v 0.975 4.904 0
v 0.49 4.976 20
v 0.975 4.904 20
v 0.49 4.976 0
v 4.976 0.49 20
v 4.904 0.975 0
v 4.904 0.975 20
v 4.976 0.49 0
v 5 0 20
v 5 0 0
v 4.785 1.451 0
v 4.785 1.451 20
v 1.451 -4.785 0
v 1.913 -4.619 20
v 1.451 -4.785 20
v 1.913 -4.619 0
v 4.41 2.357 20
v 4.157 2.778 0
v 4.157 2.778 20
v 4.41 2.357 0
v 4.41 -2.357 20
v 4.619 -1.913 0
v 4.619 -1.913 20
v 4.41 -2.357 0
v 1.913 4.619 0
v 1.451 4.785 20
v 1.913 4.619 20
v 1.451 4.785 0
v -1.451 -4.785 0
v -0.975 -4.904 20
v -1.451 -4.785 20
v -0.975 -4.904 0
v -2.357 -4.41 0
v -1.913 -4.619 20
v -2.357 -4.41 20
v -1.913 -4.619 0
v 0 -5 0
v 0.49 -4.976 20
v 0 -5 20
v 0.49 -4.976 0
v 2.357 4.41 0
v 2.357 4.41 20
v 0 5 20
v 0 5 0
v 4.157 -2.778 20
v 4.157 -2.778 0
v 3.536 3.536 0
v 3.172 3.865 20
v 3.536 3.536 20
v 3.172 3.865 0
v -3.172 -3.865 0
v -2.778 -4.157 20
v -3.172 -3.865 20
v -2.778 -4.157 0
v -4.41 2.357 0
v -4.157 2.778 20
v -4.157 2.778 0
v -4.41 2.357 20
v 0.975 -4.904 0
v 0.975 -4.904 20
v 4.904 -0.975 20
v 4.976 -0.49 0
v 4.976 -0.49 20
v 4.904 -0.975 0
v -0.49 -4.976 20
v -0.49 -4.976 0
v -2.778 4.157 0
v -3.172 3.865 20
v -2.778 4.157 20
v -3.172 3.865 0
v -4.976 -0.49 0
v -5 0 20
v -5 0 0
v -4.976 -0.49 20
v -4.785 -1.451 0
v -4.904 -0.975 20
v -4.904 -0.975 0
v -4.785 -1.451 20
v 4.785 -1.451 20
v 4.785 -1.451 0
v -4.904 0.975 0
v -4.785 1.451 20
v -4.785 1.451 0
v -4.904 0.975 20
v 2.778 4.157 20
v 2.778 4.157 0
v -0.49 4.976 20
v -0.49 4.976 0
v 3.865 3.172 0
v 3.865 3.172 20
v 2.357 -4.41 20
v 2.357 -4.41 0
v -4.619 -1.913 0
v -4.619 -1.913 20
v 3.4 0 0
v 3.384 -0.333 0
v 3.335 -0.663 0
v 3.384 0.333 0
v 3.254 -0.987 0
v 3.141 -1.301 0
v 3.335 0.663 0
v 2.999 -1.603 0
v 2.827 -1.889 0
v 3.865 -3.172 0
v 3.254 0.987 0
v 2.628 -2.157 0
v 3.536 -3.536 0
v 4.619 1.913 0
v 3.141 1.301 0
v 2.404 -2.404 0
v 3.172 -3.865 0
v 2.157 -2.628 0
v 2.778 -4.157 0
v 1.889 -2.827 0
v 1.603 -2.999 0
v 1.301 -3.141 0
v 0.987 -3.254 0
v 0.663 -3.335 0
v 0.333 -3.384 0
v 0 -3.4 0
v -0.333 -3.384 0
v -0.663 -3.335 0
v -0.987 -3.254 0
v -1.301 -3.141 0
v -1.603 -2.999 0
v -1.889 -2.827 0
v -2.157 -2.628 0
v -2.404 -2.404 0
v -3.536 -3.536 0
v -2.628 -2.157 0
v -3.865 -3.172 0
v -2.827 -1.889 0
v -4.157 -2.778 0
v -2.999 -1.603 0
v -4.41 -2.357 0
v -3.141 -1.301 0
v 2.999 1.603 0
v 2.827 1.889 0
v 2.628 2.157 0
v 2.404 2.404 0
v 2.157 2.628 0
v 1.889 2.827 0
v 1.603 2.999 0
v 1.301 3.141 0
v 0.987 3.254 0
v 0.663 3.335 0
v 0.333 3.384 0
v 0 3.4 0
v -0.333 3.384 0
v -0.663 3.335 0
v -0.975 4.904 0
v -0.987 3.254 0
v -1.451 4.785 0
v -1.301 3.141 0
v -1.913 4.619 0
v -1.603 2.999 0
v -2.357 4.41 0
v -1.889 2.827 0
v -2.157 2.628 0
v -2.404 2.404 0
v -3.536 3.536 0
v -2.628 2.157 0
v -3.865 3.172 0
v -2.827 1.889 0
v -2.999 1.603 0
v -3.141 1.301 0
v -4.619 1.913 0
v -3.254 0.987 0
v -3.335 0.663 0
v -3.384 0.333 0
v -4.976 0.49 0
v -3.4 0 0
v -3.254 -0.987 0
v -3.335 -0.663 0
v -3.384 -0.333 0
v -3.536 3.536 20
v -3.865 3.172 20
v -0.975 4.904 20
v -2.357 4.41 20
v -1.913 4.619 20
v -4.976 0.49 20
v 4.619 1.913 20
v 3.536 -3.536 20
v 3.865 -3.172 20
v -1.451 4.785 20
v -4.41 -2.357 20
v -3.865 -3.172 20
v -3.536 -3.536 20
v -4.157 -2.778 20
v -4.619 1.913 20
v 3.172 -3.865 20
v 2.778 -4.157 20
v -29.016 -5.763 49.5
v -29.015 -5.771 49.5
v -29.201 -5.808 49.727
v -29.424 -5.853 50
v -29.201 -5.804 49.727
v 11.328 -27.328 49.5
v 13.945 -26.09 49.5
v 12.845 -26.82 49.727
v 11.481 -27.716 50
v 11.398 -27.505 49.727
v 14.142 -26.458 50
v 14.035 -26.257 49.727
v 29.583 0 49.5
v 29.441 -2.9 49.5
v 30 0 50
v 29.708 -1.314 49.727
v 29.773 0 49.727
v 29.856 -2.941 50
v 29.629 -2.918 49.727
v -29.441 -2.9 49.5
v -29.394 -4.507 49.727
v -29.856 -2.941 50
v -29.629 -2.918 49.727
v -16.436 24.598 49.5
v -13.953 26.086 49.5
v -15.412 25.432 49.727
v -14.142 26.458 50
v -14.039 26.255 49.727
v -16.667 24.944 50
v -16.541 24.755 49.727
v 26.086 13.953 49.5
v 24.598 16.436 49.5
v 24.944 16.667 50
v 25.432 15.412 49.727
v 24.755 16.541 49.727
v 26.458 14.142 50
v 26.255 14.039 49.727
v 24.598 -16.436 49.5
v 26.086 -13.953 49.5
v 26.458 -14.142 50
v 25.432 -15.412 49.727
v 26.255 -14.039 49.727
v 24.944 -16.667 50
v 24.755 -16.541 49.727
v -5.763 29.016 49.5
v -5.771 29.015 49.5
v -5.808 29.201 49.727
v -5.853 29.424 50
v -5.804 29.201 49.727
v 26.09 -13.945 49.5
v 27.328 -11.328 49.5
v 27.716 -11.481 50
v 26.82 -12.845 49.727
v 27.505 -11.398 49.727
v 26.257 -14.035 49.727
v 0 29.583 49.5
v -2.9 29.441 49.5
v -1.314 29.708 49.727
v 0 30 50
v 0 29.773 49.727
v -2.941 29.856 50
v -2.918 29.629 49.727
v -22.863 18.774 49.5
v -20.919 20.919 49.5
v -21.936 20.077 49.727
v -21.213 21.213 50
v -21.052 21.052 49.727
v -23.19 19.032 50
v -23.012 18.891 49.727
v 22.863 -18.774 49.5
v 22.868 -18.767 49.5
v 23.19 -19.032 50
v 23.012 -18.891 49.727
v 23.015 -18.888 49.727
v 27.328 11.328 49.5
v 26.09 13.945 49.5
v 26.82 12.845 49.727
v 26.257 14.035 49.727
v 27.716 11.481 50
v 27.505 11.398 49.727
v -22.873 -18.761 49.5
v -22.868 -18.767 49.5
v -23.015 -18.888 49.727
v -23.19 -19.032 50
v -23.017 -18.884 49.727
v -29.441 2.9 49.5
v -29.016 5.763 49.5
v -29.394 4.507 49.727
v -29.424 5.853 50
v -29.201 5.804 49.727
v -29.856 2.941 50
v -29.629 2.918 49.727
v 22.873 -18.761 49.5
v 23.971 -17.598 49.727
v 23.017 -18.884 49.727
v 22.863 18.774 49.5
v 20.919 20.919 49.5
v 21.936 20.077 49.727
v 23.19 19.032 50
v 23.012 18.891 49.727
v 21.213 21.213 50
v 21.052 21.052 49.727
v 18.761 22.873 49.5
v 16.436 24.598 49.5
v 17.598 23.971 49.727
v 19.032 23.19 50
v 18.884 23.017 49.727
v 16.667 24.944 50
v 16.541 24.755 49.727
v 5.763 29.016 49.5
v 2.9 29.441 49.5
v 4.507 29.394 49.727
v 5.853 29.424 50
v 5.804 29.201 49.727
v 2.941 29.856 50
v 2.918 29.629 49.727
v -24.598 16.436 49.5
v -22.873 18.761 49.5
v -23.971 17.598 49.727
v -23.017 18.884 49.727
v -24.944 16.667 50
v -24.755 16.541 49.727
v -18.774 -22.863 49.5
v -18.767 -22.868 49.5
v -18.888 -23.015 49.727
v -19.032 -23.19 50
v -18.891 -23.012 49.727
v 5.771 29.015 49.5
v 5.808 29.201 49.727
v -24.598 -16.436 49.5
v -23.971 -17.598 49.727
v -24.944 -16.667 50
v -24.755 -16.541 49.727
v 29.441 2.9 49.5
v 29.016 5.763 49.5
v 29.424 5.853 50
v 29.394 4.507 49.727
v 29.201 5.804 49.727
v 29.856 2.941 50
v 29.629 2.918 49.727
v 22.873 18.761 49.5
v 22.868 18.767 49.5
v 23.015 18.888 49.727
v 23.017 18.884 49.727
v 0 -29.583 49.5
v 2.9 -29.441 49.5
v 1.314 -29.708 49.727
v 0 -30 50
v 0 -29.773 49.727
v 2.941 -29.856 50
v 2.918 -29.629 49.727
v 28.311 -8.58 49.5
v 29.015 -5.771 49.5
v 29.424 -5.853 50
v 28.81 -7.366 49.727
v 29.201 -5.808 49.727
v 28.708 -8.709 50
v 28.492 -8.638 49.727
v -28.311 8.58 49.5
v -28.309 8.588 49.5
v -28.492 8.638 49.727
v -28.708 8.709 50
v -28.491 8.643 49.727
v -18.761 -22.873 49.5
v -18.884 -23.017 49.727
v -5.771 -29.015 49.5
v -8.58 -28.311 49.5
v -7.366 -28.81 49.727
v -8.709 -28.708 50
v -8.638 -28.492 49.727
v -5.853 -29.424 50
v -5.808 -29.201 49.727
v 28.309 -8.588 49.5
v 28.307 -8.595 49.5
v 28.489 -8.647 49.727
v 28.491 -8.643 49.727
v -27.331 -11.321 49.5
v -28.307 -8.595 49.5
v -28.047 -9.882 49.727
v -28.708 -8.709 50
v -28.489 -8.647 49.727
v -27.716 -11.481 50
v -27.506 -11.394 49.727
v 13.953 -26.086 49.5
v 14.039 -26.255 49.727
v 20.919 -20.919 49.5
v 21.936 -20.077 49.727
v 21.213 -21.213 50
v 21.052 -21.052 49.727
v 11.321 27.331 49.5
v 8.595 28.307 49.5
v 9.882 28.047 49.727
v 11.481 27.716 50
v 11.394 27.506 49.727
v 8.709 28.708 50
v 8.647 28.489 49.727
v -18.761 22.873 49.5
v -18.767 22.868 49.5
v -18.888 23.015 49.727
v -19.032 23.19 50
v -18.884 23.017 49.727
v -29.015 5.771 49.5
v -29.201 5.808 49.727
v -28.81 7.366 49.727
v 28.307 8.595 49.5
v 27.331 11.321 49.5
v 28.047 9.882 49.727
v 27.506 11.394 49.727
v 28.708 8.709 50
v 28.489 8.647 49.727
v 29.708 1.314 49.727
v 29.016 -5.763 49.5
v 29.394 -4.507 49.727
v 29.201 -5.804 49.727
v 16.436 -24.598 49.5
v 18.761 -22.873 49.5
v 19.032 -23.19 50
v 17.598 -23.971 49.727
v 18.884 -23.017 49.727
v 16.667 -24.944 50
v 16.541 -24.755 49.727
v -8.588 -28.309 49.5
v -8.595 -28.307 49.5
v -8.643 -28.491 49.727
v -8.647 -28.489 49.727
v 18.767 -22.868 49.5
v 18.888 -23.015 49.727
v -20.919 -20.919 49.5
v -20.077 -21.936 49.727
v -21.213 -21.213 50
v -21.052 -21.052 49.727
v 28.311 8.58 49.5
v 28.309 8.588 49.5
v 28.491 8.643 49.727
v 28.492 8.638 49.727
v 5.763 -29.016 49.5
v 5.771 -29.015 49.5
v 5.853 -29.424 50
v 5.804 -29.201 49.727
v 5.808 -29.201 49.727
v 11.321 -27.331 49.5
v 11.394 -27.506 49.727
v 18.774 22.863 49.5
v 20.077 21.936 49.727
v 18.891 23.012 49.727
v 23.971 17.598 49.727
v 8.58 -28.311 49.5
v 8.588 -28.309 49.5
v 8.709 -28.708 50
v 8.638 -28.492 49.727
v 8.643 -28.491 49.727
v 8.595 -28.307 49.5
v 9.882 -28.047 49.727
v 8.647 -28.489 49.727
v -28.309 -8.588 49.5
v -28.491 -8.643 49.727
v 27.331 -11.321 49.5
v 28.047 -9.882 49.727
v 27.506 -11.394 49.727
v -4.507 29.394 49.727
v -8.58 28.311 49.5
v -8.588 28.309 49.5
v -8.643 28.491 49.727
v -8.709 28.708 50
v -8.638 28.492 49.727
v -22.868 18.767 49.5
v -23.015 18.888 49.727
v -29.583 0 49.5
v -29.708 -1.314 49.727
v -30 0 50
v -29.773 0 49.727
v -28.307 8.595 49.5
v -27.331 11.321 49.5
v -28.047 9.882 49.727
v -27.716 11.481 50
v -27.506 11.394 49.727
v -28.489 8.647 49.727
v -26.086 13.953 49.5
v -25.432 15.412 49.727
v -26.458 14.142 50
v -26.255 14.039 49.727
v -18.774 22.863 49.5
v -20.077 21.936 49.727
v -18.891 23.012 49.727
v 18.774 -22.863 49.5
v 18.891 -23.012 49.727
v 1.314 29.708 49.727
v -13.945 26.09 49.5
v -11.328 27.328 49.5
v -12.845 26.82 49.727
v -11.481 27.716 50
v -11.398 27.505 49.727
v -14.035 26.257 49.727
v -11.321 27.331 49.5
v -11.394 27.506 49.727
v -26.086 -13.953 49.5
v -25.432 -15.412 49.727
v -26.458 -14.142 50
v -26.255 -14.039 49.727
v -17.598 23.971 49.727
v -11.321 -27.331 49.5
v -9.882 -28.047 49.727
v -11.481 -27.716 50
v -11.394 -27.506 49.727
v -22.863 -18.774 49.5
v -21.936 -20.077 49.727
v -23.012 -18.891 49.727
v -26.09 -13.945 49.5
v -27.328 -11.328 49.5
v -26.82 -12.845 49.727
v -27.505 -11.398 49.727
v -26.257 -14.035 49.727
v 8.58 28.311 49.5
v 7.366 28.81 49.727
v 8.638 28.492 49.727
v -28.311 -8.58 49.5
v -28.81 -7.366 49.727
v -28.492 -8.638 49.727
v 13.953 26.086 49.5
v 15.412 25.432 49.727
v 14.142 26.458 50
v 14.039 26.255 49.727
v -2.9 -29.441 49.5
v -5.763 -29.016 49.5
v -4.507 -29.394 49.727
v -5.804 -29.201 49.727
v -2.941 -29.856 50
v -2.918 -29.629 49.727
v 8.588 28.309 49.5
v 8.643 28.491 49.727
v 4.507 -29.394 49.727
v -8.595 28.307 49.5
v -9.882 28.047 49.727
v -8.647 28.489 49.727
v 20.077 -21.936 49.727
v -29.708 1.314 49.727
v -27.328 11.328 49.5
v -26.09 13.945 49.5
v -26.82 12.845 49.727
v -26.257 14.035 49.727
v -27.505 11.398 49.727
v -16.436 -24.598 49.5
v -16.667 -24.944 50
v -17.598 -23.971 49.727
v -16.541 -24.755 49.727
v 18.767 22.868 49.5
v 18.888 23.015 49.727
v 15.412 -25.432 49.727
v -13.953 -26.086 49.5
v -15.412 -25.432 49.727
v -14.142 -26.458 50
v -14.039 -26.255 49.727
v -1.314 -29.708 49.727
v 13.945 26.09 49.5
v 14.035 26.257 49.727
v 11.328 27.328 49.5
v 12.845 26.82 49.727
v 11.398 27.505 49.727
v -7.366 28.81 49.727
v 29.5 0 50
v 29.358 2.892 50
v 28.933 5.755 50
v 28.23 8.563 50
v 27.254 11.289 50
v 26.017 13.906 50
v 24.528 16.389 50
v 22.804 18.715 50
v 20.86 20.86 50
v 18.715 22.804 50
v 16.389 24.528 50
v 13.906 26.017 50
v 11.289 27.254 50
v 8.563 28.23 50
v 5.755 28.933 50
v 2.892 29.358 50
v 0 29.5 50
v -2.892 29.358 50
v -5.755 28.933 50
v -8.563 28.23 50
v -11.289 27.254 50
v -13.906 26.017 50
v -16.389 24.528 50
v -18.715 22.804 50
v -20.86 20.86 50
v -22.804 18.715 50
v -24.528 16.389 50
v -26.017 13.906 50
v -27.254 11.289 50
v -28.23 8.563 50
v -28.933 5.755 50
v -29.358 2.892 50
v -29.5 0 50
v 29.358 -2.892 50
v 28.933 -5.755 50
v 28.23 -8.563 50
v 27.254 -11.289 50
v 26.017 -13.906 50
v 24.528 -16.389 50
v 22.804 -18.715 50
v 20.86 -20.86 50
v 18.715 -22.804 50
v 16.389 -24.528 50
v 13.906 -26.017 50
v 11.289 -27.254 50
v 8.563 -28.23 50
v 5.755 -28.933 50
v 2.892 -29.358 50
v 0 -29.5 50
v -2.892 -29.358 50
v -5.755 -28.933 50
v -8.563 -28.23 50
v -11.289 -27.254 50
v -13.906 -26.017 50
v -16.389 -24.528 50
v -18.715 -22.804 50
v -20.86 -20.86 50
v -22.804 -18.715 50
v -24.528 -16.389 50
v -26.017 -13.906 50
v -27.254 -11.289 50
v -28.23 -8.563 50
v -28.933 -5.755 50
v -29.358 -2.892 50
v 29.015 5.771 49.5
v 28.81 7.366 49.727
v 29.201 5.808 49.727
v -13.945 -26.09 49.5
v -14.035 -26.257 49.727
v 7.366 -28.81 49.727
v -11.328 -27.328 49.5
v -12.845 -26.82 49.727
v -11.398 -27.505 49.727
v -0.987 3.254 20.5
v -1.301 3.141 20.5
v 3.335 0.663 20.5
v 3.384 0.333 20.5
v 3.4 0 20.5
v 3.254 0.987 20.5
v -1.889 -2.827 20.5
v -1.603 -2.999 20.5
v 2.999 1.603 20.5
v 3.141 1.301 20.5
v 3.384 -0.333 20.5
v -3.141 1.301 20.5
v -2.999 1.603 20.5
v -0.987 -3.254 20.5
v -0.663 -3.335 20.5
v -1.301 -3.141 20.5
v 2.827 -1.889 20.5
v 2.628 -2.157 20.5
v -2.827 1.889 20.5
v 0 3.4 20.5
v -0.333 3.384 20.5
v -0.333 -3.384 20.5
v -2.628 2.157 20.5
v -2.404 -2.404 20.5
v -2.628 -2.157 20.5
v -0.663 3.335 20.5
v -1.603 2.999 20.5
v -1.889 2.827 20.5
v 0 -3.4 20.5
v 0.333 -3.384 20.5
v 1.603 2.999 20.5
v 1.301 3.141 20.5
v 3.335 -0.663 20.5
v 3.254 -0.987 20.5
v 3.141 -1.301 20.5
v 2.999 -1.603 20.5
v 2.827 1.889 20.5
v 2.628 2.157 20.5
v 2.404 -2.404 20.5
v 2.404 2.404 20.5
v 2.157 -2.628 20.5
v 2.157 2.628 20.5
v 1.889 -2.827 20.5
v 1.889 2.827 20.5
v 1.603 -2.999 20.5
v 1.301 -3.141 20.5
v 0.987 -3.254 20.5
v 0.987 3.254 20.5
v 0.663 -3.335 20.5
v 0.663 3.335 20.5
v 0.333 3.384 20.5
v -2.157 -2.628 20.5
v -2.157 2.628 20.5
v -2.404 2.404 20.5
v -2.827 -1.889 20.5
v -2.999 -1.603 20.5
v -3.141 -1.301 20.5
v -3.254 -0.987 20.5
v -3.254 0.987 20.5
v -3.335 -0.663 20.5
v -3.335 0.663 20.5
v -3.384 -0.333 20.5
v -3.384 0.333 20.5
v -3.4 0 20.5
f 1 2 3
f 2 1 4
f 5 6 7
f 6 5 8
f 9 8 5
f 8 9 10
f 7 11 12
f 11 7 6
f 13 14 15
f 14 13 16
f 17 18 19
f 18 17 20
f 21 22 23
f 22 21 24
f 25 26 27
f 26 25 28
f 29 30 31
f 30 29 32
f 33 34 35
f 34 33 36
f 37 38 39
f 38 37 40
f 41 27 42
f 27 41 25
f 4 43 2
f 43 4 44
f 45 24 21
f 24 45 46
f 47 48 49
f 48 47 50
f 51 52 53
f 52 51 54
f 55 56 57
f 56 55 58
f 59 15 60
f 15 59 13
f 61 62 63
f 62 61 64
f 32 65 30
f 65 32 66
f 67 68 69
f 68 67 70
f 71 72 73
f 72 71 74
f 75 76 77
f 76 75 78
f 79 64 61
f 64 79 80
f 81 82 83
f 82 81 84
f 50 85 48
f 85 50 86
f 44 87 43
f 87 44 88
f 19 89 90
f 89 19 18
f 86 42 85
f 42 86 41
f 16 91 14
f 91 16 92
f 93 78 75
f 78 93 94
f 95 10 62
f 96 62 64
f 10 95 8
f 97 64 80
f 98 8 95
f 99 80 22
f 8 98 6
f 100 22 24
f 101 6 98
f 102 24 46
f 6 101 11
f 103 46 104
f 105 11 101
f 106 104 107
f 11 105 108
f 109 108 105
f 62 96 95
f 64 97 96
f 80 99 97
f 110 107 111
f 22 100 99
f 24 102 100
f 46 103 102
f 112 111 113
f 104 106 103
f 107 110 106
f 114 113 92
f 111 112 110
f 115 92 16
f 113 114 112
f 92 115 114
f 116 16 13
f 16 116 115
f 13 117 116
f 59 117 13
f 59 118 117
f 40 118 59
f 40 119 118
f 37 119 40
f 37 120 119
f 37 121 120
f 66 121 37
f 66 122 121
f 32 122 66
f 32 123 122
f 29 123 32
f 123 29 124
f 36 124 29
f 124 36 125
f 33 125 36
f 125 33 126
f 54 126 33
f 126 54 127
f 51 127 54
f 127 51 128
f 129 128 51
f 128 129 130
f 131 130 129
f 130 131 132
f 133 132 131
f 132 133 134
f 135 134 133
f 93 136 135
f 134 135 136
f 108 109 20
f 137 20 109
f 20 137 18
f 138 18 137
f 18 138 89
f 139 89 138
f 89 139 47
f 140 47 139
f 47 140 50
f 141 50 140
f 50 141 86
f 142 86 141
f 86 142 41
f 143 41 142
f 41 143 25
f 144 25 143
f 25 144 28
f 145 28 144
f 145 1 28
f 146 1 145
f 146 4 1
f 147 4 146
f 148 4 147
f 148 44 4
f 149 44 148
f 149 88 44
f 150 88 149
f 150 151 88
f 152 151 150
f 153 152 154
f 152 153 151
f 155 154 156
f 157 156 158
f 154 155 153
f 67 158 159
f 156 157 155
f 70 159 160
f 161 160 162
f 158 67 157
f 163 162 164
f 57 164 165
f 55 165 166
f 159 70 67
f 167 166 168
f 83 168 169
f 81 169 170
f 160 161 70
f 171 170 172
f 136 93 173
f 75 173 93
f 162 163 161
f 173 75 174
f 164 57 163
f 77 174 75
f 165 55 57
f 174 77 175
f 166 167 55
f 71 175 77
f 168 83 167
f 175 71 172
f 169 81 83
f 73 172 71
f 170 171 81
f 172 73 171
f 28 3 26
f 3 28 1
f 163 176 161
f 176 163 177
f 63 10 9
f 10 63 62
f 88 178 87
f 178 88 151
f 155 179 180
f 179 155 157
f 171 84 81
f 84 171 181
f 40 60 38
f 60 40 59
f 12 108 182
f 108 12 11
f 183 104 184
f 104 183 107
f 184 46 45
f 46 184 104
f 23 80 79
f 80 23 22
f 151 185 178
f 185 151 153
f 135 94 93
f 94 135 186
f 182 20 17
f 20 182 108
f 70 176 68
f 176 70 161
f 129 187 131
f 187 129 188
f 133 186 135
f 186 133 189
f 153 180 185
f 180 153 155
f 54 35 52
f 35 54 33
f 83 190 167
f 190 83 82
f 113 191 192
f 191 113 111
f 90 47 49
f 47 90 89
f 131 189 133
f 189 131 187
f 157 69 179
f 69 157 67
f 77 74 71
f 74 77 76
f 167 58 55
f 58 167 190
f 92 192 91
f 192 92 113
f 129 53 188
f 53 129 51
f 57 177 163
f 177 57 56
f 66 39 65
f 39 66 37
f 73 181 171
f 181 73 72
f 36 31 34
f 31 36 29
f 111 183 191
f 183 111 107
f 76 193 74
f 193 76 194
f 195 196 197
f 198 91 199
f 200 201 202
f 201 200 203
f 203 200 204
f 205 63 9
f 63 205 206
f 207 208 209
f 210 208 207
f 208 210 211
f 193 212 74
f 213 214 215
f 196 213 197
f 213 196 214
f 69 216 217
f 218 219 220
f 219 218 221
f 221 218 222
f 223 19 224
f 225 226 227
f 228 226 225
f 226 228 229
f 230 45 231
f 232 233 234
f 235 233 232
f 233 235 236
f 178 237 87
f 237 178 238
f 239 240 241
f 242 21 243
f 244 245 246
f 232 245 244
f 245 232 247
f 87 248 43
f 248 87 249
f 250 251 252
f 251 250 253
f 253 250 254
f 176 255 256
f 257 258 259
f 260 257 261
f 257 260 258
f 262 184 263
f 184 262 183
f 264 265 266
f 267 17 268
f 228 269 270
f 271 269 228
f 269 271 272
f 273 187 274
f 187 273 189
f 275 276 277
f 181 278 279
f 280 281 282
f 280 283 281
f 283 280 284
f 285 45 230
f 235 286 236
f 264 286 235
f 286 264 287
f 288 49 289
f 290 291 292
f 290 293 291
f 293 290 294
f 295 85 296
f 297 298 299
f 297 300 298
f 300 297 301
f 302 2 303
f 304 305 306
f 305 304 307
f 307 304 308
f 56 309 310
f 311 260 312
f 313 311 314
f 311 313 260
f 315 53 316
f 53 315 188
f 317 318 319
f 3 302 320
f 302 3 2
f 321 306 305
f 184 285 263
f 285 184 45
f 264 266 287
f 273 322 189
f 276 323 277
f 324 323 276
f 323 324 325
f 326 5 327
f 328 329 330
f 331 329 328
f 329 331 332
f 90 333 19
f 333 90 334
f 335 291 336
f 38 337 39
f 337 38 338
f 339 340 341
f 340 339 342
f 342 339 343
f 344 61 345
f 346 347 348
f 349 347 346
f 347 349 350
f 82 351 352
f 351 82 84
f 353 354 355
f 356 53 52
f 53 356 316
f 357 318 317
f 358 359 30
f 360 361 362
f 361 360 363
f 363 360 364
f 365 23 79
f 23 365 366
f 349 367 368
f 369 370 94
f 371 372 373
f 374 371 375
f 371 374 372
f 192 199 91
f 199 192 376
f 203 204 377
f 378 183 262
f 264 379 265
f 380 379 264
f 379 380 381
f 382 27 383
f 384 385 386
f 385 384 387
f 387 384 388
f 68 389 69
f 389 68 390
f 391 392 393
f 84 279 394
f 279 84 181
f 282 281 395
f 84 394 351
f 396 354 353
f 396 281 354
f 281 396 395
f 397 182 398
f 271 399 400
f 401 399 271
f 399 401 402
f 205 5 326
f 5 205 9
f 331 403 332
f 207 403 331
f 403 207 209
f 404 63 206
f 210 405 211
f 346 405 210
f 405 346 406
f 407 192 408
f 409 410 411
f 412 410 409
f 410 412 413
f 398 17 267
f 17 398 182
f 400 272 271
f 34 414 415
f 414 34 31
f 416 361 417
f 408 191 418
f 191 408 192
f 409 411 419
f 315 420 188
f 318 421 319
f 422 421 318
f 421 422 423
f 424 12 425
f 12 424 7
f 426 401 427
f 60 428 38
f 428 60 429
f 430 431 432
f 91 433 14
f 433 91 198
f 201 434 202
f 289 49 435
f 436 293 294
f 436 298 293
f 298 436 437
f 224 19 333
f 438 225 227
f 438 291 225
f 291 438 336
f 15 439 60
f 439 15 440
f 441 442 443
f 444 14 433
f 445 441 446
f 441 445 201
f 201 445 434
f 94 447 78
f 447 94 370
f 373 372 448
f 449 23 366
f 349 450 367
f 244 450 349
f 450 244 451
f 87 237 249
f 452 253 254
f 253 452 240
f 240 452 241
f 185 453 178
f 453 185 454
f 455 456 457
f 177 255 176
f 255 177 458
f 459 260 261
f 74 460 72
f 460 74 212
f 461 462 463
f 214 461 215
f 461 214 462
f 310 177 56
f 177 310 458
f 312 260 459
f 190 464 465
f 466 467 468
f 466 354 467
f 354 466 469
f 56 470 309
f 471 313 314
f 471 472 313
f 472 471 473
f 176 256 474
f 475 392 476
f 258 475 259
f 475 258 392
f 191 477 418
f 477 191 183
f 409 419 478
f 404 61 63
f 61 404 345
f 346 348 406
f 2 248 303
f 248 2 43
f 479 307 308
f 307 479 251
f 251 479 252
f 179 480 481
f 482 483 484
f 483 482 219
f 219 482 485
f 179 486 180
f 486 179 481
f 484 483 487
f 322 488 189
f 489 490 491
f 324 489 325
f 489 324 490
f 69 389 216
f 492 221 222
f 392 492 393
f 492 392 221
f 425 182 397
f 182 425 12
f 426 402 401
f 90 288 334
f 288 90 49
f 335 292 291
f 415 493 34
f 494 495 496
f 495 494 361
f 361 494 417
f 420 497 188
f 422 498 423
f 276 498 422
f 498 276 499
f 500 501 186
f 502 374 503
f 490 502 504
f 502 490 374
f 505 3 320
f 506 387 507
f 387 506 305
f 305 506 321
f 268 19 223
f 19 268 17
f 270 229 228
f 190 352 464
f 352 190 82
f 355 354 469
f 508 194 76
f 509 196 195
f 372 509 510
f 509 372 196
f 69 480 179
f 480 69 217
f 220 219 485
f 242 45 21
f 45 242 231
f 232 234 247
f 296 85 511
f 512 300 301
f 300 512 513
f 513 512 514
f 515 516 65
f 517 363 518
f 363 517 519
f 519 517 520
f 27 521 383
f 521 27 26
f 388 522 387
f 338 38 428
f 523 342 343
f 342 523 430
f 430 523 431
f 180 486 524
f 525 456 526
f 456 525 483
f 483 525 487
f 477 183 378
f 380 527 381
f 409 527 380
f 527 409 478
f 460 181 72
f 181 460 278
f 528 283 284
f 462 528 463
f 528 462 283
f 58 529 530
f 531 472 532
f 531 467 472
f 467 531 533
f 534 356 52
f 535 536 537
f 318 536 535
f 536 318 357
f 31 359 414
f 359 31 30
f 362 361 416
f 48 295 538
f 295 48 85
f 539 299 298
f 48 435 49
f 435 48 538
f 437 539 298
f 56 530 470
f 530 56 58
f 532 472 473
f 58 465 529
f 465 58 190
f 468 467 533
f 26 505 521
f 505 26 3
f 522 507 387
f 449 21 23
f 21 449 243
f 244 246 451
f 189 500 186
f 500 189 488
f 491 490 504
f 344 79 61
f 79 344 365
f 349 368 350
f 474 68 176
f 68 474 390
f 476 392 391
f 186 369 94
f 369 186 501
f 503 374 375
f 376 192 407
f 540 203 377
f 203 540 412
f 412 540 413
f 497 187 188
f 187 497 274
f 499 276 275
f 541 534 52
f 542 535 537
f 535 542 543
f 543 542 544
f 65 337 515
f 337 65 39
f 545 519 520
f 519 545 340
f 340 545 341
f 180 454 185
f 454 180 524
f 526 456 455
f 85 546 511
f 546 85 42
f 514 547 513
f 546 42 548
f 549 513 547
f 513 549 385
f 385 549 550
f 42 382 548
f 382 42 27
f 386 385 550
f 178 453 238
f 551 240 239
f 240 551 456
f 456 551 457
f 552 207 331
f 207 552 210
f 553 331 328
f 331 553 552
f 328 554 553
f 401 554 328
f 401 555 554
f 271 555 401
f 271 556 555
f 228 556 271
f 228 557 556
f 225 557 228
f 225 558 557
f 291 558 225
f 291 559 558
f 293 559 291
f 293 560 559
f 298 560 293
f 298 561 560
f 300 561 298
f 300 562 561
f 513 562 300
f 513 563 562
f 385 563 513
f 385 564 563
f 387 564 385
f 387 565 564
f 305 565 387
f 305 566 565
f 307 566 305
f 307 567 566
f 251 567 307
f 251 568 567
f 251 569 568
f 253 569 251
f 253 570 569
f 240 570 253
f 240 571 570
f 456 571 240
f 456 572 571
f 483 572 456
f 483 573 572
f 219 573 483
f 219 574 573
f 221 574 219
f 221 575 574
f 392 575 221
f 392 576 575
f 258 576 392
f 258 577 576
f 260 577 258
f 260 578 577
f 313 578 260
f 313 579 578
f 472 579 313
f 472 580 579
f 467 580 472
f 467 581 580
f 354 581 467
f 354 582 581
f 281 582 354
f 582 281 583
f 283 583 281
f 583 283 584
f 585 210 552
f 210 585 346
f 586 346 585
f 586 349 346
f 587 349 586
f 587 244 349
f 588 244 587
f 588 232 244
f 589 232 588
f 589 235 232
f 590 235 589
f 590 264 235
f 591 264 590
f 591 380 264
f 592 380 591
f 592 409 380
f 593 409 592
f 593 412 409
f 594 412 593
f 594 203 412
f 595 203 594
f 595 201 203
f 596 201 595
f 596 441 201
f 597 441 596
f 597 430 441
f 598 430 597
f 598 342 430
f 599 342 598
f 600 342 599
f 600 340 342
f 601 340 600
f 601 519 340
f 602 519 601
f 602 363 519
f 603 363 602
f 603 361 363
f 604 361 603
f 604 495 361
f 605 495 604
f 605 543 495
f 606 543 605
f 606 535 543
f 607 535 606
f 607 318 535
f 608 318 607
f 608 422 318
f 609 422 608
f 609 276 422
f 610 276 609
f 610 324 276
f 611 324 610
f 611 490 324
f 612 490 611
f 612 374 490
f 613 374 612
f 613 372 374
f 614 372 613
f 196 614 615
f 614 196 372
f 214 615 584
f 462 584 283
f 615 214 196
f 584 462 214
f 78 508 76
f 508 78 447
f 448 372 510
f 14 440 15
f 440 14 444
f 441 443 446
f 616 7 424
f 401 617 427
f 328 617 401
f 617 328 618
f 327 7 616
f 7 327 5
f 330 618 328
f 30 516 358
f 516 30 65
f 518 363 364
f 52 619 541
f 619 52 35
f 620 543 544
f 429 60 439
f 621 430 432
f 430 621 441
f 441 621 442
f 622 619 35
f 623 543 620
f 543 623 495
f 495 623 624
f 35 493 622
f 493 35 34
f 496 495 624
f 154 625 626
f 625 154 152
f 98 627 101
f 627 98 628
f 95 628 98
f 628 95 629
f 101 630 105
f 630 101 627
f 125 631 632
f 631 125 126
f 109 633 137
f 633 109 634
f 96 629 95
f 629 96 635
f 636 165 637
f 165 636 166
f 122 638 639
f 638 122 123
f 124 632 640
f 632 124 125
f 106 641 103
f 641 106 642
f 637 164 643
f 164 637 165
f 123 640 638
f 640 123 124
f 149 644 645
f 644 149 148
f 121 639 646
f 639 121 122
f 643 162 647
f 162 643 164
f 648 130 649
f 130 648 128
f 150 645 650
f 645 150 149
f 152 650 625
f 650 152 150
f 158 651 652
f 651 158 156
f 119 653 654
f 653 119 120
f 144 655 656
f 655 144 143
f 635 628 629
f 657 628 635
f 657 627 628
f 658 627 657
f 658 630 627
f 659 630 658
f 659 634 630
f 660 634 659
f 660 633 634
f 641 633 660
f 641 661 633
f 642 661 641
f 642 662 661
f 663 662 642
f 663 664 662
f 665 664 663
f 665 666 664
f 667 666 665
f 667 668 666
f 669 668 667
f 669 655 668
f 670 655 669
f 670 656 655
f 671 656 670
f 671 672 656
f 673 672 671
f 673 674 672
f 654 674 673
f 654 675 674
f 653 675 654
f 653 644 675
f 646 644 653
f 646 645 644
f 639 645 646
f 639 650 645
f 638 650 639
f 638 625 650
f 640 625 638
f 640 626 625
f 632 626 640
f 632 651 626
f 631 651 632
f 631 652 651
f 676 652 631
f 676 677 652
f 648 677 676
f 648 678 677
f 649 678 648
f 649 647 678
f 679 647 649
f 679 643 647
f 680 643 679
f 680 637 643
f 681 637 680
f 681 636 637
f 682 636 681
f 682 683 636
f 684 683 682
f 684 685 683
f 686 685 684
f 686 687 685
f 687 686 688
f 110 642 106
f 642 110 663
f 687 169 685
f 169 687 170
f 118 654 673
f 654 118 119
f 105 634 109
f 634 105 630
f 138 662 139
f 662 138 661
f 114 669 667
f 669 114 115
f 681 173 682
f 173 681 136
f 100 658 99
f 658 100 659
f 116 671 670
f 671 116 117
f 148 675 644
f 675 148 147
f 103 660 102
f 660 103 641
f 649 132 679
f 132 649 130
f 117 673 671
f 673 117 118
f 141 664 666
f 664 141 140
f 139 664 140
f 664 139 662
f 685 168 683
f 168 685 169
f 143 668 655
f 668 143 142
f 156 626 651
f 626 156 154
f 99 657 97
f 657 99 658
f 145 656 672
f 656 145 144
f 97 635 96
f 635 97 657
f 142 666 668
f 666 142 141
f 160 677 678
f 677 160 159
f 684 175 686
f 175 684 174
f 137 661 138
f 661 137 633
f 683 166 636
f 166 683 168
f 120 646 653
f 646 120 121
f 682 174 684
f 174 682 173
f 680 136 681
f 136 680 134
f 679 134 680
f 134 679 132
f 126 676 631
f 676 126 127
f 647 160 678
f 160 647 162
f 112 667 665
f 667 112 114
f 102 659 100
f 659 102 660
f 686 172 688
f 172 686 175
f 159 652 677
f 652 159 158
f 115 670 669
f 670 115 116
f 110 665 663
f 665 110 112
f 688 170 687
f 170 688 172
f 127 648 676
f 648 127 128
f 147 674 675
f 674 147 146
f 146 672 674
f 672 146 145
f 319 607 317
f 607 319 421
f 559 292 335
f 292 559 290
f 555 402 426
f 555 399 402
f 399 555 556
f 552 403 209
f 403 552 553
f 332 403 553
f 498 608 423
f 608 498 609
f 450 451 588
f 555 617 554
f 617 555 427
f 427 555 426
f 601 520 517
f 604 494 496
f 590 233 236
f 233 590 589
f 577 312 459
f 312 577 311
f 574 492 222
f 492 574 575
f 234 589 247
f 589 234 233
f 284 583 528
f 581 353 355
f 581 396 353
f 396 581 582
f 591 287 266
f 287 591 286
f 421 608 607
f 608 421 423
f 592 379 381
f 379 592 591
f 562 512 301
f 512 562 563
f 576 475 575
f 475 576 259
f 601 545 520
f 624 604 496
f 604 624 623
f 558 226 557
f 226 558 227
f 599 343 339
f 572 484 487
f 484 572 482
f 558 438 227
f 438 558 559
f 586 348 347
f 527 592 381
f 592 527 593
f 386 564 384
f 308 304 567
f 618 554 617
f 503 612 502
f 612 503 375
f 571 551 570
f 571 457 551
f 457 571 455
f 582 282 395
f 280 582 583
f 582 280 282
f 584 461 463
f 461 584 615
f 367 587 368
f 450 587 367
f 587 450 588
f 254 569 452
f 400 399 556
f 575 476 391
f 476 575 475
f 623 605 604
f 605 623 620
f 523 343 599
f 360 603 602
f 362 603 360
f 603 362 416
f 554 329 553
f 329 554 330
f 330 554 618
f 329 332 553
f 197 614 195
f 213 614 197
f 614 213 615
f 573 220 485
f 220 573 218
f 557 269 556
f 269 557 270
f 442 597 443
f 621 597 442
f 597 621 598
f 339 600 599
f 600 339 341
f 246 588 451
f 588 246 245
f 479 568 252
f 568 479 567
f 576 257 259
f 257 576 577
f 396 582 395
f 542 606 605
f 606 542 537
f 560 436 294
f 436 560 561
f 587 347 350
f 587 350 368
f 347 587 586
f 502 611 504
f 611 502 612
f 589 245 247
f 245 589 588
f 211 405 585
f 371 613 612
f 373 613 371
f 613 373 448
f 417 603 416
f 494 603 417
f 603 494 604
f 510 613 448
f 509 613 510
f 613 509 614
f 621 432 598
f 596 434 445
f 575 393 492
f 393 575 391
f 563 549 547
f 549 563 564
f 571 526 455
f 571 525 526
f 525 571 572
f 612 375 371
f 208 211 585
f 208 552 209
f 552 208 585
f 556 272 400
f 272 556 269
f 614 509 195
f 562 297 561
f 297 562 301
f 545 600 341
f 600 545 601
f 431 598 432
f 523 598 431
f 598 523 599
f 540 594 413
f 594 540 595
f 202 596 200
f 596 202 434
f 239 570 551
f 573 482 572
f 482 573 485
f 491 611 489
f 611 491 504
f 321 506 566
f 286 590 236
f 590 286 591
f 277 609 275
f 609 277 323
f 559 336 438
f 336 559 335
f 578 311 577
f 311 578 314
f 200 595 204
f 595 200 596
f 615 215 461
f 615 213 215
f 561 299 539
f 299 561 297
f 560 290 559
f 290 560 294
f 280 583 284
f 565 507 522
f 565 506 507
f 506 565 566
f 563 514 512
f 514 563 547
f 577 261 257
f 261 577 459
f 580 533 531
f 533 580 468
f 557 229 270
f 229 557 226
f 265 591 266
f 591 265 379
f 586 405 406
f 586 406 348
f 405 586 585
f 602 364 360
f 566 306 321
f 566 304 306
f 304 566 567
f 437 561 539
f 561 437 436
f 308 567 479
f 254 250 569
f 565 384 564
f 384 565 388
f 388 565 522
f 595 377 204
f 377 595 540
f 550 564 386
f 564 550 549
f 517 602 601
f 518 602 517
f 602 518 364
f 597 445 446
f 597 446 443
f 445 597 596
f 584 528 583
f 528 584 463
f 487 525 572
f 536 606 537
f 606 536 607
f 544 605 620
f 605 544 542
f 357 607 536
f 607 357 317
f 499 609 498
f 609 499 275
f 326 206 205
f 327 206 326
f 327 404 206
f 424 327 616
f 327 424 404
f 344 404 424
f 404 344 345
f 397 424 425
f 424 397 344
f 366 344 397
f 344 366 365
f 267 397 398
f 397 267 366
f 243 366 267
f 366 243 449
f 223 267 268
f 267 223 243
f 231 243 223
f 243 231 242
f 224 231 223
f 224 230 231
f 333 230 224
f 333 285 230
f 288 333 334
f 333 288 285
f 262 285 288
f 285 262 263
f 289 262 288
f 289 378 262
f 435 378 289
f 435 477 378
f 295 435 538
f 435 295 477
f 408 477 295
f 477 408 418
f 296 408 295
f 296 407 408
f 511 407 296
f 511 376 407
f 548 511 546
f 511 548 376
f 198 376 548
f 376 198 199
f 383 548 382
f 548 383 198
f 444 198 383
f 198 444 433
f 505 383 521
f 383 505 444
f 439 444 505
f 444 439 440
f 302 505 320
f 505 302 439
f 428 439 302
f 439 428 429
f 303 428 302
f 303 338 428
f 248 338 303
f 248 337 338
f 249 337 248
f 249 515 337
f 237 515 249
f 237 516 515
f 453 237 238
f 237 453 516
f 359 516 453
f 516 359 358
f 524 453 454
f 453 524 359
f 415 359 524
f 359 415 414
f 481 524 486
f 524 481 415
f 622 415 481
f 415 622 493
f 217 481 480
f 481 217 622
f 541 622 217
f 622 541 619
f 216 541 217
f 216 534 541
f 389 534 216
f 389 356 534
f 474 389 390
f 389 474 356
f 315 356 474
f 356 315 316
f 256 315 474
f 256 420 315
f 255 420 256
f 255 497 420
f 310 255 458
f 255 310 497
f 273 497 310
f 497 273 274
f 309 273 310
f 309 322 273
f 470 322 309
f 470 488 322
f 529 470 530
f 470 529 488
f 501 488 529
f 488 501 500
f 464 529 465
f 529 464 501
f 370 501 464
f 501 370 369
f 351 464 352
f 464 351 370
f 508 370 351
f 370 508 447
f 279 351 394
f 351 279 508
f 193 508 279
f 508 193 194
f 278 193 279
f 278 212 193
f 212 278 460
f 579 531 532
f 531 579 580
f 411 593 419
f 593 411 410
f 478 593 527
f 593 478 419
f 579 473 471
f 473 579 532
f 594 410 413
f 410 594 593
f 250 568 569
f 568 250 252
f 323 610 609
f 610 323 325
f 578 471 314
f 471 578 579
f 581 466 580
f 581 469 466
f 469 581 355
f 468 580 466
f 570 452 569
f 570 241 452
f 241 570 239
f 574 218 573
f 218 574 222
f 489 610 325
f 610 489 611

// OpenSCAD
// Funnel with spout - printed upright, wide opening at the top
// Units: mm. Wall thickness: 1.6 mm.

$fn = 64;

// ---- Spout ----
spout_od     = 10;    // spout outer diameter
spout_length = 20;    // spout length (z = 0 to z = 20)
spout_bore   = spout_od - 2 * 1.6;  // bore = 6.8 mm

// ---- Cone / funnel body ----
cone_top_d   = 60;    // rim outer diameter at z = 50
cone_bottom_d = 10;   // cone outer diameter at z = 20 (spout top)
cone_h       = 30;    // cone height (z = 20 to z = 50)

// ---- Cut clearance ----
eps = 0.5;            // extension past cut faces

// Derived
cone_top_z   = spout_length + cone_h;   // 50

difference() {
    union() {
        // Spout (tube)
        cylinder(h = spout_length, d = spout_od);

        // Cone: 10 mm at z = 20, 60 mm at z = 50
        translate([0, 0, spout_length])
            cylinder(h = cone_h, d1 = cone_bottom_d, d2 = cone_top_d);
    }

    // Bore through the spout
    translate([0, 0, -eps])
        cylinder(h = spout_length + 2 * eps, d = spout_bore);

    // Open top rim
    translate([0, 0, cone_top_z - eps])
        cylinder(h = eps, d1 = cone_top_d, d2 = cone_top_d - 2 * eps);
}
